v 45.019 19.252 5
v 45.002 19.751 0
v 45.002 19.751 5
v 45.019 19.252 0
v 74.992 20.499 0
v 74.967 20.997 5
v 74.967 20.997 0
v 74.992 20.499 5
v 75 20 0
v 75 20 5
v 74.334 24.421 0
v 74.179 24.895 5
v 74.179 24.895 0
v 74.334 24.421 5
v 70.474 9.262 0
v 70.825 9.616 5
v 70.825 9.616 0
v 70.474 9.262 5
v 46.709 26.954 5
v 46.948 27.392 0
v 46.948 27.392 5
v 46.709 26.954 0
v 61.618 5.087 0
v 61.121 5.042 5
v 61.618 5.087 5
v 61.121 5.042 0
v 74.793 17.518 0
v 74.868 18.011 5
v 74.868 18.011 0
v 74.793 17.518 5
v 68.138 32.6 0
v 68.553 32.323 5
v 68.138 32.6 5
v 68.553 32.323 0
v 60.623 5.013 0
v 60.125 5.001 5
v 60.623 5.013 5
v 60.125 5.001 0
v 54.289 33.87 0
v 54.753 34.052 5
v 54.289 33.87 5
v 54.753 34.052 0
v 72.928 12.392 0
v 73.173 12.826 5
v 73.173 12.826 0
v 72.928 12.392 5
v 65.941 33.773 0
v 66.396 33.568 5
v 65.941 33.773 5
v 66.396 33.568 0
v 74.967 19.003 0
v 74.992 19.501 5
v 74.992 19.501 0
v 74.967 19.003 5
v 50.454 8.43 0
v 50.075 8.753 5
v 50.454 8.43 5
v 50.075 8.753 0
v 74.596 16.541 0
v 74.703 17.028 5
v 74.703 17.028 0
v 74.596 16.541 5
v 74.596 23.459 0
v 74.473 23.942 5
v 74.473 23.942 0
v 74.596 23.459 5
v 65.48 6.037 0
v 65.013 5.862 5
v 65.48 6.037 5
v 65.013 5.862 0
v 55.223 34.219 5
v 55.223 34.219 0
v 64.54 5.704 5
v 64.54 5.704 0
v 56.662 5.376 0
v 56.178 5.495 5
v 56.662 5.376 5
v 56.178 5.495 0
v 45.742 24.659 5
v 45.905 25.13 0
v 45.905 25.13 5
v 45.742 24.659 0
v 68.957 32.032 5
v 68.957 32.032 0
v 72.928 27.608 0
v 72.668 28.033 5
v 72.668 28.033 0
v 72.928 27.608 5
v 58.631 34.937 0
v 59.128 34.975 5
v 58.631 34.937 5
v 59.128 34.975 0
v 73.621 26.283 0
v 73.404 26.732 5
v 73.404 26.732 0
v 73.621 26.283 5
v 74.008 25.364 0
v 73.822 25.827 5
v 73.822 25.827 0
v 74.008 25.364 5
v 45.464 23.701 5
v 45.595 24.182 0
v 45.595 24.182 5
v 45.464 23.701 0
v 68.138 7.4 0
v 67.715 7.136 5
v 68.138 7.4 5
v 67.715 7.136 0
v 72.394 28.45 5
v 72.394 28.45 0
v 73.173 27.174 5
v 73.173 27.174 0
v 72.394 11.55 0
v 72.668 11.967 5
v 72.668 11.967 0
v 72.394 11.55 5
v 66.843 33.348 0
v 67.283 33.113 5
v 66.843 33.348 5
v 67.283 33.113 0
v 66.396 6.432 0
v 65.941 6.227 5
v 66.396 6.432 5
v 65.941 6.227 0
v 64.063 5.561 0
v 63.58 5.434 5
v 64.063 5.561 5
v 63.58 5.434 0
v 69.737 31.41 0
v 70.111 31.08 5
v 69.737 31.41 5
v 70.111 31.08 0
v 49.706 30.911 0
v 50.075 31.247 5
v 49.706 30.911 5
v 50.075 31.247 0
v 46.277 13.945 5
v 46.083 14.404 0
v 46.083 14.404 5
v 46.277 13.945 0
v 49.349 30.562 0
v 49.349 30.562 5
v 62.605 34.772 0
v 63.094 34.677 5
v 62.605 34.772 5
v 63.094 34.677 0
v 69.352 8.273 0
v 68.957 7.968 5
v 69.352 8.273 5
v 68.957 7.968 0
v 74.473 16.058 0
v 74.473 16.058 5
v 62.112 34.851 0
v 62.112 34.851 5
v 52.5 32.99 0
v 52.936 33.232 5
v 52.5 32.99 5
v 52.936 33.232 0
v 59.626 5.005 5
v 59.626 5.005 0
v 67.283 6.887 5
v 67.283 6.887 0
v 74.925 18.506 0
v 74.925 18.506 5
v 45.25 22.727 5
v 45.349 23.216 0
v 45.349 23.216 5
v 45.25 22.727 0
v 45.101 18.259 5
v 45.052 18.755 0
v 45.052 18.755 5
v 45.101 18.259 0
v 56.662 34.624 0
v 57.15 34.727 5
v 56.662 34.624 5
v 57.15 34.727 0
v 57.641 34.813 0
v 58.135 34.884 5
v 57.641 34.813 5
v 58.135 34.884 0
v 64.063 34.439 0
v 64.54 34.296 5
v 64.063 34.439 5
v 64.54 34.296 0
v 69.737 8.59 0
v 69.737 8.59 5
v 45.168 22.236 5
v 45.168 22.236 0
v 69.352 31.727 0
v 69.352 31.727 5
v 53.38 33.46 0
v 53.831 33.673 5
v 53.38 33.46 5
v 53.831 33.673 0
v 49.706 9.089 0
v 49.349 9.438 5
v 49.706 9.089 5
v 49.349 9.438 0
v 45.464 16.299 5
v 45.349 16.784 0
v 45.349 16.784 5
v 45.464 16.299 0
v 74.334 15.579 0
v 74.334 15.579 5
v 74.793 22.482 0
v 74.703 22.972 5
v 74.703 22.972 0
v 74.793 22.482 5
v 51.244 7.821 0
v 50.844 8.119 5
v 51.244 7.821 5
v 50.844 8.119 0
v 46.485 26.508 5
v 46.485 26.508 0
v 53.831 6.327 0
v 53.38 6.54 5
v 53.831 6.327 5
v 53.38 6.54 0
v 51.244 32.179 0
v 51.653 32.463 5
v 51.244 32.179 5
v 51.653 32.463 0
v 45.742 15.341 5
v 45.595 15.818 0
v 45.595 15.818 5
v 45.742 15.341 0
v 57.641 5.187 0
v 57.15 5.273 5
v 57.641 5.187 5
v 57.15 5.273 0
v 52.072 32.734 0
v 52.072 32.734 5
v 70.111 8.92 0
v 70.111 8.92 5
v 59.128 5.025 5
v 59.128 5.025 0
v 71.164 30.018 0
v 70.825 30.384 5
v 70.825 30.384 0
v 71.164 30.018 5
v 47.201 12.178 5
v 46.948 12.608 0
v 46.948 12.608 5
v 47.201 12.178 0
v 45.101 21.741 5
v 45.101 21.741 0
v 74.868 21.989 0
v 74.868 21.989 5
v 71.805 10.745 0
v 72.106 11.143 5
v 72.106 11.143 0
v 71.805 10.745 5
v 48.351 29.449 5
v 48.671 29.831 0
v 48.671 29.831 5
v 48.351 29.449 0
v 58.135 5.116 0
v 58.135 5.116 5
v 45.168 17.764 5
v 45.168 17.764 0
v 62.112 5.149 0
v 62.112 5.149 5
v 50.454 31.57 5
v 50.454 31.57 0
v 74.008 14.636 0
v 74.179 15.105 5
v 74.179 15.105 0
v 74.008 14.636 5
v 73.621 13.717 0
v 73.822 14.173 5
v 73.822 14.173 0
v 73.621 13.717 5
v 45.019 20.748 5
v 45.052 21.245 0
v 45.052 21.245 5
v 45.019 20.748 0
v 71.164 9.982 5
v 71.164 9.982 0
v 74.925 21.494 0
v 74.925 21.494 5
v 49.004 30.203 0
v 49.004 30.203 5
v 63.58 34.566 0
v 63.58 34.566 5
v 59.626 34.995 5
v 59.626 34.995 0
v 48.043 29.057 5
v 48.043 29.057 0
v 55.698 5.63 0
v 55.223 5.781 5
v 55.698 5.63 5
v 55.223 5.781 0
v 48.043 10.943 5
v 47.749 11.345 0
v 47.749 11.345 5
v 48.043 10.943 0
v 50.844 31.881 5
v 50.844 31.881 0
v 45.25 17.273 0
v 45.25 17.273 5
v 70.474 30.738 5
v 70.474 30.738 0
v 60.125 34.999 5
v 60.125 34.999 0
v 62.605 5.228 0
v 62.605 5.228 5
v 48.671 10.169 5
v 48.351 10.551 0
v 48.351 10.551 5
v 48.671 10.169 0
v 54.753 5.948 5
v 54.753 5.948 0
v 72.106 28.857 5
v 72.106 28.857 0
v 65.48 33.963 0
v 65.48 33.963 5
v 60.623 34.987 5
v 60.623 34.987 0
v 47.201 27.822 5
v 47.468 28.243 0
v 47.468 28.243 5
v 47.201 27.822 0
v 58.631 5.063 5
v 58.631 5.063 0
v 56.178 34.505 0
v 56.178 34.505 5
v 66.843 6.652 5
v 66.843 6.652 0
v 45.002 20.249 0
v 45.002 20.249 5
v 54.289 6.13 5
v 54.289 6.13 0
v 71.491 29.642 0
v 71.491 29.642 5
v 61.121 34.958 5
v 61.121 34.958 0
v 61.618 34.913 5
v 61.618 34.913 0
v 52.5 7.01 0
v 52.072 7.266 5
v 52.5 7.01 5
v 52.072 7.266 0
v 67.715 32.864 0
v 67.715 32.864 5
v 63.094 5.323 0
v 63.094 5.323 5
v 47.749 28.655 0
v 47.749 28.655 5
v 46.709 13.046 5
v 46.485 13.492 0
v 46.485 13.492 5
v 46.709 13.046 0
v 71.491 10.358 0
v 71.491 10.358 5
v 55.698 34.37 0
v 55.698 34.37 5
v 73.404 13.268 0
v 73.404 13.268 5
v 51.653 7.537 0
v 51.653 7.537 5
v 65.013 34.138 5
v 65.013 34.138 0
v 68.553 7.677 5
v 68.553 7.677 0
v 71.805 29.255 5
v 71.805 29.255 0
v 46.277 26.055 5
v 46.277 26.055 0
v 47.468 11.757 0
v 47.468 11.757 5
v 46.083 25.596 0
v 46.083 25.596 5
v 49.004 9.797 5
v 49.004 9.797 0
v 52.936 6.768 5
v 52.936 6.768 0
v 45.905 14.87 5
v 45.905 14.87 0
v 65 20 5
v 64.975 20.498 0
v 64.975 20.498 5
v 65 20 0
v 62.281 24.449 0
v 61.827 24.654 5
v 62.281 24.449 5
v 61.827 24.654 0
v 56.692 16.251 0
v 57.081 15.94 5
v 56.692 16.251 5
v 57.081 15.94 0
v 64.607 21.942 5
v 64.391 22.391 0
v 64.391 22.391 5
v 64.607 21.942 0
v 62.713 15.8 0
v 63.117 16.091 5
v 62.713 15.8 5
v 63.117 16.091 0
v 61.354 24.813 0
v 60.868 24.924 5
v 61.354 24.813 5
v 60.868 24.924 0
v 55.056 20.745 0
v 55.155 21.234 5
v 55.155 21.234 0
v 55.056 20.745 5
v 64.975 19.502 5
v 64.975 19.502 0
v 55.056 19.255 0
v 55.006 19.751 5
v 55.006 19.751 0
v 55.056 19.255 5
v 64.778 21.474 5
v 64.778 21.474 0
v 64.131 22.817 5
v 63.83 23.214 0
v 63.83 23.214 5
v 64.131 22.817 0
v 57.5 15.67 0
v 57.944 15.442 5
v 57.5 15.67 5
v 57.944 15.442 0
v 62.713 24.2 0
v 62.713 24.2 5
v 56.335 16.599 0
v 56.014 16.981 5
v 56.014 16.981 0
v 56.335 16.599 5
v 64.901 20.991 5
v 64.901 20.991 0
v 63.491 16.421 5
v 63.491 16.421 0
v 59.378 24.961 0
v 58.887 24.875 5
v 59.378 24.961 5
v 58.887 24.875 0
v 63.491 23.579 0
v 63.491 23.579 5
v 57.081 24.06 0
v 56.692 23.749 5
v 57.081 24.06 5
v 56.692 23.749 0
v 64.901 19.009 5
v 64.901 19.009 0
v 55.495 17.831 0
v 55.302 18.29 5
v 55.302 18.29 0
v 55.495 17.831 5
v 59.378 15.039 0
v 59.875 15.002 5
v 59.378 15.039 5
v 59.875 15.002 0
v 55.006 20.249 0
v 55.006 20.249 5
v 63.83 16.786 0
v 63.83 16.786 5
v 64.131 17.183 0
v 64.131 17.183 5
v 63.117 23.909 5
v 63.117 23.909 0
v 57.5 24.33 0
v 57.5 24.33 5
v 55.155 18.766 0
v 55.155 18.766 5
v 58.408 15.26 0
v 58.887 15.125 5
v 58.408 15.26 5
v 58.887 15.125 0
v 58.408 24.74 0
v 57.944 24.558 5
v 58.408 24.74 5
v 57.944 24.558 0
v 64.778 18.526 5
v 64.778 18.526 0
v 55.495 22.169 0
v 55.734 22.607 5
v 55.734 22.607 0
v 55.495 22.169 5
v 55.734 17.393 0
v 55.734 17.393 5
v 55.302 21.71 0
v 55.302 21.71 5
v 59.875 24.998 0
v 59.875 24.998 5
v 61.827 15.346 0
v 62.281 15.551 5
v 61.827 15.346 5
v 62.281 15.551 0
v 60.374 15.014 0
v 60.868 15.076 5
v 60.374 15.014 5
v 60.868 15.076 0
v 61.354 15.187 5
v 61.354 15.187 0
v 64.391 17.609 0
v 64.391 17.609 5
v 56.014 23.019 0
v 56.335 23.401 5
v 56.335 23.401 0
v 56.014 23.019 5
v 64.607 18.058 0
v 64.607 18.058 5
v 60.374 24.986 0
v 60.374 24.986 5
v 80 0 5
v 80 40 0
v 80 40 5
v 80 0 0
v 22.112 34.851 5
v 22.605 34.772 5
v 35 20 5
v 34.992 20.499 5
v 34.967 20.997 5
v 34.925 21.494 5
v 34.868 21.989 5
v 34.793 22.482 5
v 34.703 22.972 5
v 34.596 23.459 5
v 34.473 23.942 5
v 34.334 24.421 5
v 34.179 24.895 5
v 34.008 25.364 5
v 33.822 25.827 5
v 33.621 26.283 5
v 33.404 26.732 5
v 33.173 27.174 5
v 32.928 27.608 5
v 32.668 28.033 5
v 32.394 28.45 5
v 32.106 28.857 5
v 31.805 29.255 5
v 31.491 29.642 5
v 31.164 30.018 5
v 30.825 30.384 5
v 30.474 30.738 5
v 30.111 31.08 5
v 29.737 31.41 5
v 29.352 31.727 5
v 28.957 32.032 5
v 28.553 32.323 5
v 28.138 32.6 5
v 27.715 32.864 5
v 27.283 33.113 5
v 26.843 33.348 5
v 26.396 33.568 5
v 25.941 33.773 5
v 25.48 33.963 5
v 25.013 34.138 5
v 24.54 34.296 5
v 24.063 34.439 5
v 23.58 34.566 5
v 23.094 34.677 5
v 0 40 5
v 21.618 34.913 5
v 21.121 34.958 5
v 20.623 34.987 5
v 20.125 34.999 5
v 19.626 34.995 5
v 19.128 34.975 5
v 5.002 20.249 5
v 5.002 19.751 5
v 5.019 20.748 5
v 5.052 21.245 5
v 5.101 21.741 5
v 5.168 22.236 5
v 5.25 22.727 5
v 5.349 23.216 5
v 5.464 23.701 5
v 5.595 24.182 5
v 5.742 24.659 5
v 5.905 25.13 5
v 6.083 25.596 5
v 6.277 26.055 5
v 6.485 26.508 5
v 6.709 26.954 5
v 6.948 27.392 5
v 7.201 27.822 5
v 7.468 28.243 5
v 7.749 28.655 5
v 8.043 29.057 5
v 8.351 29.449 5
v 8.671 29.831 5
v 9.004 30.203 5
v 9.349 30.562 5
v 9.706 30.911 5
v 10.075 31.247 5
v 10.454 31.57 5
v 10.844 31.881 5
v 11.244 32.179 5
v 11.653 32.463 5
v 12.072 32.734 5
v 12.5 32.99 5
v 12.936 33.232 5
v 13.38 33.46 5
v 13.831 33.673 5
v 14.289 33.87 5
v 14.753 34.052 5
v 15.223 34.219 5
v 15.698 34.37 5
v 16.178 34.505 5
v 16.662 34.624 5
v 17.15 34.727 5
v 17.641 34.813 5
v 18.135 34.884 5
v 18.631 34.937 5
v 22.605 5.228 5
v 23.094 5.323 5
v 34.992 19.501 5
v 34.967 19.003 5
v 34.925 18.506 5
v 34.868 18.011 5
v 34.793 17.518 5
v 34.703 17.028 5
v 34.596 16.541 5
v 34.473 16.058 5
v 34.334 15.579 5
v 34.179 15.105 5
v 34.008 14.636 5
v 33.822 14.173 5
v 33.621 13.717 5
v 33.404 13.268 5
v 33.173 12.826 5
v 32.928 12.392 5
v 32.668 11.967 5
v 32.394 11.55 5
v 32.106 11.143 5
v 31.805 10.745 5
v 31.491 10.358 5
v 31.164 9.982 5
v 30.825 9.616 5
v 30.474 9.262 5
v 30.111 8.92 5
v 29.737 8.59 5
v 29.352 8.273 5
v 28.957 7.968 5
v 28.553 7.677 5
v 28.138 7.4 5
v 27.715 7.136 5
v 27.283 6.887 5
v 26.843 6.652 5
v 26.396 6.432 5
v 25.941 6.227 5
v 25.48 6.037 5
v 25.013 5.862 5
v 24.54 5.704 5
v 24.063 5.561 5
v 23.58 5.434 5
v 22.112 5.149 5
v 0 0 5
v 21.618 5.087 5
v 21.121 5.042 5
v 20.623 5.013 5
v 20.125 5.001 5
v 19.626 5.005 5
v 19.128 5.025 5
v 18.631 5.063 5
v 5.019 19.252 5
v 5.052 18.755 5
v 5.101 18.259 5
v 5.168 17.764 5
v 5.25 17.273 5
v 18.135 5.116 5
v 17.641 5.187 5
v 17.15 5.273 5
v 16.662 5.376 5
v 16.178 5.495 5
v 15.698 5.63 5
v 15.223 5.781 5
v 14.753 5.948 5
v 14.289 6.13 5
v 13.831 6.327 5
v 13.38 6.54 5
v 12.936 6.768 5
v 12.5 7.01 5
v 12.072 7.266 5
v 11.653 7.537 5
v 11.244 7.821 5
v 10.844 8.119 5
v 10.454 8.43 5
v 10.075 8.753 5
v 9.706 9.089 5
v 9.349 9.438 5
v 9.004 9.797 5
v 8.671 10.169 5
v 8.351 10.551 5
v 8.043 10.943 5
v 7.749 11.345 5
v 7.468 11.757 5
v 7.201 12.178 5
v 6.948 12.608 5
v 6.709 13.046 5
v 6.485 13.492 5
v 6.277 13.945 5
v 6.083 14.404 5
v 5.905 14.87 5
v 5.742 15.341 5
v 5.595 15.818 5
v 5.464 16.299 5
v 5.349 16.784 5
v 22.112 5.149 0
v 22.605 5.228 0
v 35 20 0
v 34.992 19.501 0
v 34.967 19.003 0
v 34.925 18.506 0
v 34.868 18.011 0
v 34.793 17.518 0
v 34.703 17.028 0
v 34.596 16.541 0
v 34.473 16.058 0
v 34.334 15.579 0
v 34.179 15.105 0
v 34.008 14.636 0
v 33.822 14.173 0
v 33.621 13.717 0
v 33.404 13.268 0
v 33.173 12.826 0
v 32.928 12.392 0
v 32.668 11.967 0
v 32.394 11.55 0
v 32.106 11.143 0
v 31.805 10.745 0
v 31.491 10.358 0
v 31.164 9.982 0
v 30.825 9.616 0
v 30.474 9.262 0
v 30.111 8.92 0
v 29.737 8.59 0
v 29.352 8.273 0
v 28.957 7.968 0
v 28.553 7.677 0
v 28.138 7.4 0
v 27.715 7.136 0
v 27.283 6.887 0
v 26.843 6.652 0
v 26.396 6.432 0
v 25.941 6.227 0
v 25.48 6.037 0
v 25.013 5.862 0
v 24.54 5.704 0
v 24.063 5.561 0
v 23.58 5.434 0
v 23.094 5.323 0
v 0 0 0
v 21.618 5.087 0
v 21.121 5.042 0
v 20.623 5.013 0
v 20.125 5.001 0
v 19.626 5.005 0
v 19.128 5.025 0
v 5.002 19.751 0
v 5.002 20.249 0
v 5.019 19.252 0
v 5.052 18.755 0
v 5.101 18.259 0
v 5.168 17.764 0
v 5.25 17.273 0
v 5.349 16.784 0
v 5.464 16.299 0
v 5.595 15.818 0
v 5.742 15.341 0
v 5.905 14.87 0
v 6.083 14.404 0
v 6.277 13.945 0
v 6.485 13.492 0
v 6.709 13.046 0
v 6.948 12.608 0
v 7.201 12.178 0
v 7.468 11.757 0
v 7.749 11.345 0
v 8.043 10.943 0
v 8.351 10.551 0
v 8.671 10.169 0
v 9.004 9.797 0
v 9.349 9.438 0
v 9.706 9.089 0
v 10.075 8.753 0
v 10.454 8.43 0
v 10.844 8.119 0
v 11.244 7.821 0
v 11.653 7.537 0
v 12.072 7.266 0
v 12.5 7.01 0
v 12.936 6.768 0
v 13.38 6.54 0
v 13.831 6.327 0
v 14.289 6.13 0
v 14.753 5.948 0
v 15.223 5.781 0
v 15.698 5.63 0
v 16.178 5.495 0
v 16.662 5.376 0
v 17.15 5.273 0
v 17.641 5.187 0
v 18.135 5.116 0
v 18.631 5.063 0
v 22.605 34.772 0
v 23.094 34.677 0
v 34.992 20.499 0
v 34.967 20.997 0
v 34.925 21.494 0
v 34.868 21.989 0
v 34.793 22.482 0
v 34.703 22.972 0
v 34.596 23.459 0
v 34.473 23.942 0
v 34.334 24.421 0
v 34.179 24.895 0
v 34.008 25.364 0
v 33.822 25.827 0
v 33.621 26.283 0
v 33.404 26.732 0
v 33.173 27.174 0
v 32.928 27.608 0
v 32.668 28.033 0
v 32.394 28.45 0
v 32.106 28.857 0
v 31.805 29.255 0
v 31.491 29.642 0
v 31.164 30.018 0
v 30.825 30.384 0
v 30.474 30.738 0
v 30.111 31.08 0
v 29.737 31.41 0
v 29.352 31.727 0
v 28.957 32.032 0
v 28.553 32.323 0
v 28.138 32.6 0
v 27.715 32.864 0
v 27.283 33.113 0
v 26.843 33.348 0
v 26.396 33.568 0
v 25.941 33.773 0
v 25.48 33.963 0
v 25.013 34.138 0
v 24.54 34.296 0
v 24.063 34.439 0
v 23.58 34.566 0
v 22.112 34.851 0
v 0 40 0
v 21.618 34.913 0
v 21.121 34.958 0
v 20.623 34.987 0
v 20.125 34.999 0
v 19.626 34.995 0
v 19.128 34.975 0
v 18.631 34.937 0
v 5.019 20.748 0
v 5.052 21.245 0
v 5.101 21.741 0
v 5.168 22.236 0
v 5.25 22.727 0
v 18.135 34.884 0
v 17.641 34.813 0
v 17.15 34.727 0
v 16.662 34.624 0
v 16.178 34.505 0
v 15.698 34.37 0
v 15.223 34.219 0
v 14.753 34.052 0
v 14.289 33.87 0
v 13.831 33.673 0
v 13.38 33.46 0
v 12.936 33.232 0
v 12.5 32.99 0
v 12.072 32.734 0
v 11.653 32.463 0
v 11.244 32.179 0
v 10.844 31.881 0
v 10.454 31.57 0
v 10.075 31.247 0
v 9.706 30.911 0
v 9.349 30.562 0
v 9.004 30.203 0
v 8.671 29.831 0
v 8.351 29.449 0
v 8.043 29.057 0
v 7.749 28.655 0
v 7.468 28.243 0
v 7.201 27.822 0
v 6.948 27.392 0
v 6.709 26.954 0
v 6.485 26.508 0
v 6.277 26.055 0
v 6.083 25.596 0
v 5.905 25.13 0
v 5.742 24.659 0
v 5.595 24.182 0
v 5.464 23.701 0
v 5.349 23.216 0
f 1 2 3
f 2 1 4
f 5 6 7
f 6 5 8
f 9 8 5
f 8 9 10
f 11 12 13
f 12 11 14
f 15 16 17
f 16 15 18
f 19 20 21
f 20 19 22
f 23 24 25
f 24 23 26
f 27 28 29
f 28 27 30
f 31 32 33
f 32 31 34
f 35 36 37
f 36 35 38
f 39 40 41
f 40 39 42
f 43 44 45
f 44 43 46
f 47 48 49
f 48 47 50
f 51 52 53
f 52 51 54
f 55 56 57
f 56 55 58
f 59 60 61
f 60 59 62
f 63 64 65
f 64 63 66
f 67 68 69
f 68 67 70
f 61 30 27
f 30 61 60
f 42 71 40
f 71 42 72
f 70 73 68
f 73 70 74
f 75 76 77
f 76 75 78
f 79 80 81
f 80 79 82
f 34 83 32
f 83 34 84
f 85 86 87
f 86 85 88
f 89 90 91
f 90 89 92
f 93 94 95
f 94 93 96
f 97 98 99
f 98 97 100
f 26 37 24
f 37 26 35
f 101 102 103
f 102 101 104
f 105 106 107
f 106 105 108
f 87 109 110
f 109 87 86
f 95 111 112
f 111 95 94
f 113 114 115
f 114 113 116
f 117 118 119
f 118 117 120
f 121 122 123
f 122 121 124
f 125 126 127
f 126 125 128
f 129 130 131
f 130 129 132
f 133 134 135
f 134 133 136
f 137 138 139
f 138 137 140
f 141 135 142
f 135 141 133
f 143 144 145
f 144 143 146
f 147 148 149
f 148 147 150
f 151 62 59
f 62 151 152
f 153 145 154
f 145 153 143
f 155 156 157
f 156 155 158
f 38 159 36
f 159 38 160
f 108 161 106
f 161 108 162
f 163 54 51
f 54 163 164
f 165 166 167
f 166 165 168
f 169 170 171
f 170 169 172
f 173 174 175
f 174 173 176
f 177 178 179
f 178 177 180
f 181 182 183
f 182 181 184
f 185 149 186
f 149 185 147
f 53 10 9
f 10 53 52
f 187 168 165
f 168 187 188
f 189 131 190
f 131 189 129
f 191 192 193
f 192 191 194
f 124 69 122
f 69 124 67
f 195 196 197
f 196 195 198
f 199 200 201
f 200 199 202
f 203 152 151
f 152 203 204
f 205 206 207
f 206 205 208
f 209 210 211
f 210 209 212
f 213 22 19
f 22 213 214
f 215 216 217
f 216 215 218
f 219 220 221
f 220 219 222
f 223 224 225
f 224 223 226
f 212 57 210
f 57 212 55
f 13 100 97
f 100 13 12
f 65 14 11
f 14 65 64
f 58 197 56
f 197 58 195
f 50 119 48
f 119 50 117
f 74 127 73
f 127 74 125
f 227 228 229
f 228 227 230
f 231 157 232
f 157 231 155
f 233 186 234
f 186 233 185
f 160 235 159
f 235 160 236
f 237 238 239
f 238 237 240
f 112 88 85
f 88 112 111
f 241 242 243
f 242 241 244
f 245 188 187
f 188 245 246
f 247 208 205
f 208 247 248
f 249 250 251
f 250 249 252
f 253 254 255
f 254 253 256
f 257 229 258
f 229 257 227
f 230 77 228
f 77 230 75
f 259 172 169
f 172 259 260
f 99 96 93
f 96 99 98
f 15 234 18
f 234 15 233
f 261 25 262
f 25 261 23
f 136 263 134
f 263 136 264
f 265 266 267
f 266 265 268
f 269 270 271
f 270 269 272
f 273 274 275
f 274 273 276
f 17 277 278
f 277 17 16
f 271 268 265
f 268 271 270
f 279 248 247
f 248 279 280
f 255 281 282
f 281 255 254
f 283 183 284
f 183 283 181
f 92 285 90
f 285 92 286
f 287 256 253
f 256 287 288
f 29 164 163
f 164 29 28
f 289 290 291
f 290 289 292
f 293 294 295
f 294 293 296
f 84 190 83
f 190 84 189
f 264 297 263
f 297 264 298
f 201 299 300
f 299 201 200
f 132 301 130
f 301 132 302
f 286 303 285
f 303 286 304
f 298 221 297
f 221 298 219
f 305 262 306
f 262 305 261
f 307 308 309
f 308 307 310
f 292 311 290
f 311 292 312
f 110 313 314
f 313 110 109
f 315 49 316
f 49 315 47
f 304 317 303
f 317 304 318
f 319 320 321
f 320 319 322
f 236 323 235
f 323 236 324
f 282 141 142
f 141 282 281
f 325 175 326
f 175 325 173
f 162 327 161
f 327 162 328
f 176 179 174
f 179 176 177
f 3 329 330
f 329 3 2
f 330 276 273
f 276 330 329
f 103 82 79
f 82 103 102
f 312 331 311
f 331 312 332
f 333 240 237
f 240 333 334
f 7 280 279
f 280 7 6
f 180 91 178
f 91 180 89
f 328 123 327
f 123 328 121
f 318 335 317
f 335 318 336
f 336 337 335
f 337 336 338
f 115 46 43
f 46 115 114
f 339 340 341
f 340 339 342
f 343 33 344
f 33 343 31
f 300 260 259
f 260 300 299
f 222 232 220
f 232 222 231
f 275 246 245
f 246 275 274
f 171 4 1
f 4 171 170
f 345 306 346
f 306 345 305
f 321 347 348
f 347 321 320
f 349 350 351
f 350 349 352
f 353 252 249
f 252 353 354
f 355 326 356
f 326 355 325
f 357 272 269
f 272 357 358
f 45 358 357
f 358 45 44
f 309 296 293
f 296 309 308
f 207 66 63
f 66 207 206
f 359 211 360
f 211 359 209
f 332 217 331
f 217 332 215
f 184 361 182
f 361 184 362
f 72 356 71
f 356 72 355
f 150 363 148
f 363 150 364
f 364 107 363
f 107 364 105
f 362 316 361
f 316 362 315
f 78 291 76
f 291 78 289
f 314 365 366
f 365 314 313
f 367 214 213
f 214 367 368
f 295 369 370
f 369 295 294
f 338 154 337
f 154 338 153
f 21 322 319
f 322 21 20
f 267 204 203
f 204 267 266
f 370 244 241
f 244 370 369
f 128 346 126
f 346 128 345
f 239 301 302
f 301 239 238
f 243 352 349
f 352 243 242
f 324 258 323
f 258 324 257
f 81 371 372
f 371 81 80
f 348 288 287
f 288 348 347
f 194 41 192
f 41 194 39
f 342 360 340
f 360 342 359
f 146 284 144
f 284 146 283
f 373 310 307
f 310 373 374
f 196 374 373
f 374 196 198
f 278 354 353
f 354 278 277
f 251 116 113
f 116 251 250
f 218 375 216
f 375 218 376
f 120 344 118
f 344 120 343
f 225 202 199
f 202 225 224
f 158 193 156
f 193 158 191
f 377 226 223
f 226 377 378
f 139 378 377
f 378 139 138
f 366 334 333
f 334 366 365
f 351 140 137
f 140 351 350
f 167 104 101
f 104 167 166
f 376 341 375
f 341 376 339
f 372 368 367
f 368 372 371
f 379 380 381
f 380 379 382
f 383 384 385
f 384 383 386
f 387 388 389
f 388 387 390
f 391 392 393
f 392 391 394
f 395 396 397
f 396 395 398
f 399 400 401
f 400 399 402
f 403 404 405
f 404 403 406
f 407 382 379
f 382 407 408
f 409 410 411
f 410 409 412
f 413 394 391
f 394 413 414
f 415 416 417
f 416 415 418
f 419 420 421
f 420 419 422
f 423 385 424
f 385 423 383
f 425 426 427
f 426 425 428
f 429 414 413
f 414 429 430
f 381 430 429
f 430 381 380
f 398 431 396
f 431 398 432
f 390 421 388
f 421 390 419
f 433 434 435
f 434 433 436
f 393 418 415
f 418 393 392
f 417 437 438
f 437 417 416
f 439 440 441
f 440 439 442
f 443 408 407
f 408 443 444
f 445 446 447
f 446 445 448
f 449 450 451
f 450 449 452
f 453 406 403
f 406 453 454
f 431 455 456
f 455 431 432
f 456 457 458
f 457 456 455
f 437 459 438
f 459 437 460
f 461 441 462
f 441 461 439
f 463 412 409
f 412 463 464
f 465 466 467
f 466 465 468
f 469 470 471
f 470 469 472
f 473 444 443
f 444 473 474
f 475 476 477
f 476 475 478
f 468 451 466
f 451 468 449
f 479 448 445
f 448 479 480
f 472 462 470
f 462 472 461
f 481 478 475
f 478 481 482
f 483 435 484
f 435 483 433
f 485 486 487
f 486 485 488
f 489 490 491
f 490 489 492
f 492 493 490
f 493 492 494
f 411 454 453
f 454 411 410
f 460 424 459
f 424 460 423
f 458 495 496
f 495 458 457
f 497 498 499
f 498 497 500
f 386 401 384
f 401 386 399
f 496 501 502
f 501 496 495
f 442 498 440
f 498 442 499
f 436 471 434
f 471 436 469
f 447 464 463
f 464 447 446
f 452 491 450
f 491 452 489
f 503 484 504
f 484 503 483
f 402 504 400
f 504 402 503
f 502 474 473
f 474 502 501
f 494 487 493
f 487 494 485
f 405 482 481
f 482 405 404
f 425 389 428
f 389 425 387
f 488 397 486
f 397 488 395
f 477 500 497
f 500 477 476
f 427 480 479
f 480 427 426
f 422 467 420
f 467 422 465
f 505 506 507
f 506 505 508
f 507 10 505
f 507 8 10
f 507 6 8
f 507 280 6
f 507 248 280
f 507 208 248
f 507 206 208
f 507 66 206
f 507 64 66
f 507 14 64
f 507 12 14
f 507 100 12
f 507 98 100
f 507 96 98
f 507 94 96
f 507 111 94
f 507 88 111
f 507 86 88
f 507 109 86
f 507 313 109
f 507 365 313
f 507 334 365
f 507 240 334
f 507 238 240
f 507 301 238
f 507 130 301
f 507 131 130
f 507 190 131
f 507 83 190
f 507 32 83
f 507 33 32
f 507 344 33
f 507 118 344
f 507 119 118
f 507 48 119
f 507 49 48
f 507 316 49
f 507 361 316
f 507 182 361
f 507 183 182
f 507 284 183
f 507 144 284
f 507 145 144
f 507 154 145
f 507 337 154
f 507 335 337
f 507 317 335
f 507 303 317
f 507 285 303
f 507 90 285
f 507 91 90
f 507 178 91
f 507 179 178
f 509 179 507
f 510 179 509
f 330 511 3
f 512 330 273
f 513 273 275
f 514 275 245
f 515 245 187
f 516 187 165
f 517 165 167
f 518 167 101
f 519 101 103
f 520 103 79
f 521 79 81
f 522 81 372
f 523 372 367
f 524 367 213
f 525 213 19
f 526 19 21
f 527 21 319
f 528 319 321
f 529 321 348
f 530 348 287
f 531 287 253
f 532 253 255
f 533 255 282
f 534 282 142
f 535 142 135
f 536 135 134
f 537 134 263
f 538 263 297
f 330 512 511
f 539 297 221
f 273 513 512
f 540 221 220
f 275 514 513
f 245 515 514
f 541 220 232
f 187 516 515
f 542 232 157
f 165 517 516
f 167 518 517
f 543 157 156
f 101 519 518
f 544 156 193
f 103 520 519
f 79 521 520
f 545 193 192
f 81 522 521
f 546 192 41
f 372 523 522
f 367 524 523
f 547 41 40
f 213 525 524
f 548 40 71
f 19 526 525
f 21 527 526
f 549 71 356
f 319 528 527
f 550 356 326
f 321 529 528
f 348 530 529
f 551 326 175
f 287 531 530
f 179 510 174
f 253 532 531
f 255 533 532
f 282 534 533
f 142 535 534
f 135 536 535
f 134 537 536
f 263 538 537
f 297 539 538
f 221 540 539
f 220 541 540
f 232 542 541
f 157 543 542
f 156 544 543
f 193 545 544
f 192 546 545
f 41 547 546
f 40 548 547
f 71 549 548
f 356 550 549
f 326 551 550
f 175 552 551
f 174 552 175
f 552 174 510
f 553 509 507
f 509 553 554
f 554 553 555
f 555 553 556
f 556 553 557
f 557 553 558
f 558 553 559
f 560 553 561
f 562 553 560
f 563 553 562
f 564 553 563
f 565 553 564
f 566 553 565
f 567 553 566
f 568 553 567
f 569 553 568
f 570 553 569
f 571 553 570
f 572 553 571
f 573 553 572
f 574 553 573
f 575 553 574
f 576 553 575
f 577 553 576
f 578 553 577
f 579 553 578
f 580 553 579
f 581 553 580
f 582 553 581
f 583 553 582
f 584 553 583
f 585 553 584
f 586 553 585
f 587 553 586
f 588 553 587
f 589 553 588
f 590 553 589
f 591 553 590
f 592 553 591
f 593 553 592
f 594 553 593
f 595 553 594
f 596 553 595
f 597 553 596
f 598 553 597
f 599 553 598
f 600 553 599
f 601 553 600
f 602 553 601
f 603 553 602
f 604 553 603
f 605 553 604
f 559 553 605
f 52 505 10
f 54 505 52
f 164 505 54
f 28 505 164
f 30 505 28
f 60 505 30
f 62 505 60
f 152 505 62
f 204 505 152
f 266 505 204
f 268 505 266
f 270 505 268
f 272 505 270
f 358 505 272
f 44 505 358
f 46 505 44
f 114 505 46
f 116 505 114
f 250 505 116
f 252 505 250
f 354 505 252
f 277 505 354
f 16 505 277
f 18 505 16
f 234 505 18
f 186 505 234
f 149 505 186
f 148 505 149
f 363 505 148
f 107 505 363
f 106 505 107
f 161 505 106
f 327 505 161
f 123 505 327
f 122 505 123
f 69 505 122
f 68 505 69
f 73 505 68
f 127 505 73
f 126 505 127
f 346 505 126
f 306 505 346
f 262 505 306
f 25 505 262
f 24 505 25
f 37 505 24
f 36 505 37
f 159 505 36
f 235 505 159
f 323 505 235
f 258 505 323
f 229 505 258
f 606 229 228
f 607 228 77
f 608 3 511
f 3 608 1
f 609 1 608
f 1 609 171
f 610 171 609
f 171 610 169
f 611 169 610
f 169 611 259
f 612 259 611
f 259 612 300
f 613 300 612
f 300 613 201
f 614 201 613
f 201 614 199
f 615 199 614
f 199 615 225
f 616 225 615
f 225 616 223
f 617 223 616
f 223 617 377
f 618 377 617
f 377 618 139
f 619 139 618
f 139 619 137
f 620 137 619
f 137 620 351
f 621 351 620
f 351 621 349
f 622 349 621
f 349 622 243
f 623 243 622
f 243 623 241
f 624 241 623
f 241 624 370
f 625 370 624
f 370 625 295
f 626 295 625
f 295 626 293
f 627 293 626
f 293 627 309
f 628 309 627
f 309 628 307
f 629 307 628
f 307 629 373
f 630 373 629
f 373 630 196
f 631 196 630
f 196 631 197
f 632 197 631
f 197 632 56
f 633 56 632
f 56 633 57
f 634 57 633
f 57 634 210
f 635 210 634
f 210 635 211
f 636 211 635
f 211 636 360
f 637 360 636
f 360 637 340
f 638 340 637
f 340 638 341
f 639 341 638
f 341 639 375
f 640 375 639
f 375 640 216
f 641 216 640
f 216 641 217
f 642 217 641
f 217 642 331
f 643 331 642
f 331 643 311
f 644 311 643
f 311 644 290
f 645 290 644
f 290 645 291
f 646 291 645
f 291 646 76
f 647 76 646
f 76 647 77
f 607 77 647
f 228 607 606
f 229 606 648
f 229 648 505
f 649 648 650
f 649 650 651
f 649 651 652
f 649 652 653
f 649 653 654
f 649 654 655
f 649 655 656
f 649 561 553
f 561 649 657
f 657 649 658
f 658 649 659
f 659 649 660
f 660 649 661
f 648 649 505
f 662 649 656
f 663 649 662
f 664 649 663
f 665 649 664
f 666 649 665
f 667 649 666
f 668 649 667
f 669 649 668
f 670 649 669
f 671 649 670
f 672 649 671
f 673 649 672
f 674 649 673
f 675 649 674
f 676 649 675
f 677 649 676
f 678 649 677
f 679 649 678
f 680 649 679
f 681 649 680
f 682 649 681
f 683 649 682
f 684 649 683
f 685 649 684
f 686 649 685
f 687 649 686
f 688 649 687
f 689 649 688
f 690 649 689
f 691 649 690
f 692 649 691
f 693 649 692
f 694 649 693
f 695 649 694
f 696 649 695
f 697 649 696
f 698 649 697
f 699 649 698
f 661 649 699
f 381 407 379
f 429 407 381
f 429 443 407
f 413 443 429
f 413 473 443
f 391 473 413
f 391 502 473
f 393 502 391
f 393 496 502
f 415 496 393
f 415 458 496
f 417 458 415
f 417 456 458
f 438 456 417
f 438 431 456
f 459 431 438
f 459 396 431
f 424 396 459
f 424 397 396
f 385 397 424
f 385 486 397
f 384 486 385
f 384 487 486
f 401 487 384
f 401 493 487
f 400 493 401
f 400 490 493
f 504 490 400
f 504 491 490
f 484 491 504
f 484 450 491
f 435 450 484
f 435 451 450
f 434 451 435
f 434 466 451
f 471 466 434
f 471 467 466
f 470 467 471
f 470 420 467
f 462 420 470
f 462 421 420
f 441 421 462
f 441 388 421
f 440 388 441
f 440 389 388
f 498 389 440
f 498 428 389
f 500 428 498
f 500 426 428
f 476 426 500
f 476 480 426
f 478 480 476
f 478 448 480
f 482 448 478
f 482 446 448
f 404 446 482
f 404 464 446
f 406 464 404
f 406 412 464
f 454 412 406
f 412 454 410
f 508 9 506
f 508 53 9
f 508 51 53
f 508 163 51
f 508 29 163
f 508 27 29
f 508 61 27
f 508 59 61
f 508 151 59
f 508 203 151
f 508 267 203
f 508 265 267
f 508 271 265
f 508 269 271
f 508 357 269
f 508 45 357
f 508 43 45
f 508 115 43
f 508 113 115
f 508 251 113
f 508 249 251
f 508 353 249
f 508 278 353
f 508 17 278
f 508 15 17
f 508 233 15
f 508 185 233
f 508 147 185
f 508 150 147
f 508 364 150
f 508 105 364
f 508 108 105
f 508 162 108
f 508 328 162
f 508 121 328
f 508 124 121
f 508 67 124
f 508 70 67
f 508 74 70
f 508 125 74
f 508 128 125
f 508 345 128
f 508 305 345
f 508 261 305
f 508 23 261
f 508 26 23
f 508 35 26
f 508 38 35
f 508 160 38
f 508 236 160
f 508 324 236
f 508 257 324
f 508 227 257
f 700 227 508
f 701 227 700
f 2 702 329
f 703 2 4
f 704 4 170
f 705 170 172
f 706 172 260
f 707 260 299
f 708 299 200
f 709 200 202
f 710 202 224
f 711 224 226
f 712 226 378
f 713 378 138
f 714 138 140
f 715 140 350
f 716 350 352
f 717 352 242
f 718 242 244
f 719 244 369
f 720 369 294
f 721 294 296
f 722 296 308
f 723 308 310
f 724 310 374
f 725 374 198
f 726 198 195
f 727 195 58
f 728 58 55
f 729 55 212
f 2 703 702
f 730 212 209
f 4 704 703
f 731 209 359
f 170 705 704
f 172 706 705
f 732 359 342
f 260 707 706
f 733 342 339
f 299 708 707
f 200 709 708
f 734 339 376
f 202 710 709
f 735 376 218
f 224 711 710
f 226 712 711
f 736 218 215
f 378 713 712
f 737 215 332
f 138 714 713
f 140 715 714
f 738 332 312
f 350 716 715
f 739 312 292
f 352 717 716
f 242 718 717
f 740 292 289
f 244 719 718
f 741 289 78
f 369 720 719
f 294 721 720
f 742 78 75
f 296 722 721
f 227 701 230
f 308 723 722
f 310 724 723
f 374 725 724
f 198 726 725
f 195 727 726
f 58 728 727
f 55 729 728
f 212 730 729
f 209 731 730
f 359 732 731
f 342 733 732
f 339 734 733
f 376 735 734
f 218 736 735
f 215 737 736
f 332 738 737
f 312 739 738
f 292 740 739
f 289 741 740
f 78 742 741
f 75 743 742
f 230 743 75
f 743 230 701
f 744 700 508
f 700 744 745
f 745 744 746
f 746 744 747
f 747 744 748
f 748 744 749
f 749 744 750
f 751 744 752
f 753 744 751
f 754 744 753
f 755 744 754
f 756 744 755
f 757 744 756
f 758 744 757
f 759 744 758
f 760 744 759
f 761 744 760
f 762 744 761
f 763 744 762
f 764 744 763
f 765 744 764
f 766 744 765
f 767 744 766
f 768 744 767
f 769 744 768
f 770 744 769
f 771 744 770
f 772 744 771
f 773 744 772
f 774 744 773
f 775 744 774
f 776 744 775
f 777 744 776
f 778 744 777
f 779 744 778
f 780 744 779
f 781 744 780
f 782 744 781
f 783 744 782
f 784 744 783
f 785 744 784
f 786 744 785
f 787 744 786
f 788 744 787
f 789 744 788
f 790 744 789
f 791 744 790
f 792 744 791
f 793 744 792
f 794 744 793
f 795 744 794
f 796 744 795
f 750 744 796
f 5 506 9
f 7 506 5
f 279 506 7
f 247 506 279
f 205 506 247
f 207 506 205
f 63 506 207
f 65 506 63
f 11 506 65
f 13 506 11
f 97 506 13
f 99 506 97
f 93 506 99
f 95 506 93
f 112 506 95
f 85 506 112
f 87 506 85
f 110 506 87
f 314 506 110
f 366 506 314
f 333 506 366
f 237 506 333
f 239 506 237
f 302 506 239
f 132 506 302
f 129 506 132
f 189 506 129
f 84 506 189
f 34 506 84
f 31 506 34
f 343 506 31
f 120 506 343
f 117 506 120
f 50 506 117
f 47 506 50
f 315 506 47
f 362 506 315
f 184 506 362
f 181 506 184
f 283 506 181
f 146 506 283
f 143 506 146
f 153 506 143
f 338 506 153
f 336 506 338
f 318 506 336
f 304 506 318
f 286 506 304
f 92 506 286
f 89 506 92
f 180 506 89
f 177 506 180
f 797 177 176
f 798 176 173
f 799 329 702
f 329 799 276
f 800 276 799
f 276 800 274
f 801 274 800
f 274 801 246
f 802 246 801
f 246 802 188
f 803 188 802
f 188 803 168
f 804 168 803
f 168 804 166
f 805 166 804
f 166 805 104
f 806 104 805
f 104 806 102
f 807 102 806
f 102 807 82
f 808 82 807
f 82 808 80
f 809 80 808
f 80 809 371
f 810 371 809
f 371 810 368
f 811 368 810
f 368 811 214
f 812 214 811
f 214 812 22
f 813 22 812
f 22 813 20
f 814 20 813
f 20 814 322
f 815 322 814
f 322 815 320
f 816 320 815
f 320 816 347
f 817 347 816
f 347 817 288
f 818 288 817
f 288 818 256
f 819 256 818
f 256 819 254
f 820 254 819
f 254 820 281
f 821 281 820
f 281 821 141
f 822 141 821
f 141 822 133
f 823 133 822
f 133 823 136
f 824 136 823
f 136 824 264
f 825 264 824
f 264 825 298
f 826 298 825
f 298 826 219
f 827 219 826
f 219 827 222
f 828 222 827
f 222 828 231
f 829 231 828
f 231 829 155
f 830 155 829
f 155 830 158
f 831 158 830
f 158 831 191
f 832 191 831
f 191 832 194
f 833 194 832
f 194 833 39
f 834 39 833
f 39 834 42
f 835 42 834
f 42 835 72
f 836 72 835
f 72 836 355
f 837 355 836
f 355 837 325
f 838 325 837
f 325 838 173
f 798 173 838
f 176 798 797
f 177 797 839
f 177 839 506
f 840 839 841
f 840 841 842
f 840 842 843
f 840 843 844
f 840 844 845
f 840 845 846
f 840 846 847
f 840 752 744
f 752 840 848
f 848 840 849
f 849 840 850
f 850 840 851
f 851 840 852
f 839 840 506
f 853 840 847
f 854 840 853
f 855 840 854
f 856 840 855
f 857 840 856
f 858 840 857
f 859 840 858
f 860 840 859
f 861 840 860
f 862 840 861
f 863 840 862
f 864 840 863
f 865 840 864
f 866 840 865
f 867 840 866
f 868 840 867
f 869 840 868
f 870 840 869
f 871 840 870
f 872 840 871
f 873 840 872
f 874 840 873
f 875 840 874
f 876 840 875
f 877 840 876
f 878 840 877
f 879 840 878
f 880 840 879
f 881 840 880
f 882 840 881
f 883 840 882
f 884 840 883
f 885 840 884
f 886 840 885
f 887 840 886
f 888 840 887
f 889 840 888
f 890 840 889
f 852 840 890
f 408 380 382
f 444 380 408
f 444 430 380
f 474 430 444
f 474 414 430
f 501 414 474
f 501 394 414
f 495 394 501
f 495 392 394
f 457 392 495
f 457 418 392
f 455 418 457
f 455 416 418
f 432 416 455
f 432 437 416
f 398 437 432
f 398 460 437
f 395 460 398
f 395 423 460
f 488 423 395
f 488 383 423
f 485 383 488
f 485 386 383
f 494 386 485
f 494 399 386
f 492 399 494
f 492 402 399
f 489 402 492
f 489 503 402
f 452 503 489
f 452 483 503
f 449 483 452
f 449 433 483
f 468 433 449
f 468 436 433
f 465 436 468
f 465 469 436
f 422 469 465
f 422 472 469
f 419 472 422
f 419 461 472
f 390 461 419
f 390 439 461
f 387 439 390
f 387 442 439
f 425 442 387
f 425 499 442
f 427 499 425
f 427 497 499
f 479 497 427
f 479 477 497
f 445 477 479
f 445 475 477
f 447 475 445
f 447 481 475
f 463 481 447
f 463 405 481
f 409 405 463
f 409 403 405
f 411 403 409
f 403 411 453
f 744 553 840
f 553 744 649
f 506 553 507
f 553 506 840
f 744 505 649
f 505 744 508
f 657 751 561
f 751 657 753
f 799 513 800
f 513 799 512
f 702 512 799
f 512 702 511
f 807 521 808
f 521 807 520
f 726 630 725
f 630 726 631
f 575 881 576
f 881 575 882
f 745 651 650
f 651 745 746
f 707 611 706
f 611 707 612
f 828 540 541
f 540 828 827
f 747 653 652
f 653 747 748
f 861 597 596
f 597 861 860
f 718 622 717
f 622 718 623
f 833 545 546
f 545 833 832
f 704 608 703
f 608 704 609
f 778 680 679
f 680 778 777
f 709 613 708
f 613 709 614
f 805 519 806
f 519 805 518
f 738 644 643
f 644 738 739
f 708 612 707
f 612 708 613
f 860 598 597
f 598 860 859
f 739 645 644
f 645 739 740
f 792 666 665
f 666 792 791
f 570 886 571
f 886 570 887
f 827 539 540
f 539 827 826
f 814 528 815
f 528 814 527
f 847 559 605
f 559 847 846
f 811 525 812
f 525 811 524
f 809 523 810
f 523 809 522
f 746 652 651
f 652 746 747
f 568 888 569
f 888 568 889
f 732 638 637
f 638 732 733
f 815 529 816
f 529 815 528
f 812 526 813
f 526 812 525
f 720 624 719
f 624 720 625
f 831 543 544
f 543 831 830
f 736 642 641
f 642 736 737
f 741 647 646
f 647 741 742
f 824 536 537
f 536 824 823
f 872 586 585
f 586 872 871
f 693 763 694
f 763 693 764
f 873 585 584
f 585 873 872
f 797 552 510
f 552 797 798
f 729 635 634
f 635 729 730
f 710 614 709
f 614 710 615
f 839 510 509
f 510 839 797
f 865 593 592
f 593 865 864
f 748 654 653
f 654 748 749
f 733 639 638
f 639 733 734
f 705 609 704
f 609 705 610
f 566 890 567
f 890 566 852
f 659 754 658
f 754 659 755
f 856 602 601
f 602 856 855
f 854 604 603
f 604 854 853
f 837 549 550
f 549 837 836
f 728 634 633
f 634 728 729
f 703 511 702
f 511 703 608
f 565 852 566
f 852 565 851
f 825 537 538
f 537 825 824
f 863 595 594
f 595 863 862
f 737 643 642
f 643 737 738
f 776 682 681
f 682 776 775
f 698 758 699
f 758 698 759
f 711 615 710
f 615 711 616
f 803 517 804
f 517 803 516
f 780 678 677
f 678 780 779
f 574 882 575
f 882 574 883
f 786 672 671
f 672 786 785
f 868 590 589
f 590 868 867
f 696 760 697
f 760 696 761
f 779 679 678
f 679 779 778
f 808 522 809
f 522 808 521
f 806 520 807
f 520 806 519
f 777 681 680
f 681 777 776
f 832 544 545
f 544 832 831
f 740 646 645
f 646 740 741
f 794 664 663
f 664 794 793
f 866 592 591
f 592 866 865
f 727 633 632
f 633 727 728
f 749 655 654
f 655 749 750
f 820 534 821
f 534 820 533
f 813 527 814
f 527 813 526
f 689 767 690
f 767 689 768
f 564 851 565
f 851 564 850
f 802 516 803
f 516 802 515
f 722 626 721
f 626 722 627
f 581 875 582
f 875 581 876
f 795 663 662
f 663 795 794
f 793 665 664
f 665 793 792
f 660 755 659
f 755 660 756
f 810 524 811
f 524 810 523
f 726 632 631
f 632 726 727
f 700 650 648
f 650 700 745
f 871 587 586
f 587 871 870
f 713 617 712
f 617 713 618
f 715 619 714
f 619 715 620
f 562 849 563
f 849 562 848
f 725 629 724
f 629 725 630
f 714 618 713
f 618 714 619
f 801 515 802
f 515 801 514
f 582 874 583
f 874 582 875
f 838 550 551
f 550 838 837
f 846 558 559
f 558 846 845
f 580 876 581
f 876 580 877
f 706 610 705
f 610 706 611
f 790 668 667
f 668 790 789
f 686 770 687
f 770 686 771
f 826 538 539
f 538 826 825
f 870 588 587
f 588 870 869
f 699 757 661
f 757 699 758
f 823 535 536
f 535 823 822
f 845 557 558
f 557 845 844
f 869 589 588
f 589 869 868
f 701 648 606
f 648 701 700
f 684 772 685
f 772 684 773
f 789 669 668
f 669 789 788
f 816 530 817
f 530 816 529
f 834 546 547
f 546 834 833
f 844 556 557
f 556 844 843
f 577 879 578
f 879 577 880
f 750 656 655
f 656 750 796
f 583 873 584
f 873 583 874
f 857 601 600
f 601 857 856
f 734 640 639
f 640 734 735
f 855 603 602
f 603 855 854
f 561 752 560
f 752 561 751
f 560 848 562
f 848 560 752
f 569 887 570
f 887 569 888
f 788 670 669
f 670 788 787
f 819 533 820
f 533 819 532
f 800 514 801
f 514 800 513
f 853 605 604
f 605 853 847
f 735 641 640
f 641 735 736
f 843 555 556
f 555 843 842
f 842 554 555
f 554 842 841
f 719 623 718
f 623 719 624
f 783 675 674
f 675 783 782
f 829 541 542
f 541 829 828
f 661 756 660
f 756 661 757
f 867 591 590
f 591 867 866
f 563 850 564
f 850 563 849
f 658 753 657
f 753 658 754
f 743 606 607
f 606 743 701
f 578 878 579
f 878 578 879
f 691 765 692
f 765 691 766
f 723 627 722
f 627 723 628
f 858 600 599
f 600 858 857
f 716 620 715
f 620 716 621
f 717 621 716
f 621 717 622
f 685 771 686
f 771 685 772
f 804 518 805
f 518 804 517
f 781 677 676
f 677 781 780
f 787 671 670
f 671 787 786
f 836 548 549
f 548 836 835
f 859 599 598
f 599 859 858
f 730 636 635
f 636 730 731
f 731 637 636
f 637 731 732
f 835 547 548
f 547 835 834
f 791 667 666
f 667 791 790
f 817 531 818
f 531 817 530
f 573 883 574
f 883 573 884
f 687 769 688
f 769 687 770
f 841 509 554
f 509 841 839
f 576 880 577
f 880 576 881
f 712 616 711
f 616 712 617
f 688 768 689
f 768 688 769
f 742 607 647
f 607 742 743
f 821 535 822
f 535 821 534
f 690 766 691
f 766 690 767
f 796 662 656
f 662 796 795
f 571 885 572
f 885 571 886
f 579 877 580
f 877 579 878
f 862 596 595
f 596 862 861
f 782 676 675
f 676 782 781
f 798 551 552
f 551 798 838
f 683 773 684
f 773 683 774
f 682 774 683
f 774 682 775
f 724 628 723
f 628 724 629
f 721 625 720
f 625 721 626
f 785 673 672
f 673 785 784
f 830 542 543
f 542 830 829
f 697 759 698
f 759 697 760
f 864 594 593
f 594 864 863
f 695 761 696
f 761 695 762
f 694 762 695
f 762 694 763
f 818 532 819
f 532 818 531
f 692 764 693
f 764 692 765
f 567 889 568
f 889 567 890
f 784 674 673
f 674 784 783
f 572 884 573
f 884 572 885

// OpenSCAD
$fs = 0.5;
$fa = 1;

difference() {
	cube([80, 40, 5]);
	translate([20, 20, -1]) {
		cylinder(r=15, h=7);
	}
	translate([60, 20, -1]) {
		difference() {
			cylinder(r=15, h=7);
			cylinder(r=5, h=7);
		}
	}
}
